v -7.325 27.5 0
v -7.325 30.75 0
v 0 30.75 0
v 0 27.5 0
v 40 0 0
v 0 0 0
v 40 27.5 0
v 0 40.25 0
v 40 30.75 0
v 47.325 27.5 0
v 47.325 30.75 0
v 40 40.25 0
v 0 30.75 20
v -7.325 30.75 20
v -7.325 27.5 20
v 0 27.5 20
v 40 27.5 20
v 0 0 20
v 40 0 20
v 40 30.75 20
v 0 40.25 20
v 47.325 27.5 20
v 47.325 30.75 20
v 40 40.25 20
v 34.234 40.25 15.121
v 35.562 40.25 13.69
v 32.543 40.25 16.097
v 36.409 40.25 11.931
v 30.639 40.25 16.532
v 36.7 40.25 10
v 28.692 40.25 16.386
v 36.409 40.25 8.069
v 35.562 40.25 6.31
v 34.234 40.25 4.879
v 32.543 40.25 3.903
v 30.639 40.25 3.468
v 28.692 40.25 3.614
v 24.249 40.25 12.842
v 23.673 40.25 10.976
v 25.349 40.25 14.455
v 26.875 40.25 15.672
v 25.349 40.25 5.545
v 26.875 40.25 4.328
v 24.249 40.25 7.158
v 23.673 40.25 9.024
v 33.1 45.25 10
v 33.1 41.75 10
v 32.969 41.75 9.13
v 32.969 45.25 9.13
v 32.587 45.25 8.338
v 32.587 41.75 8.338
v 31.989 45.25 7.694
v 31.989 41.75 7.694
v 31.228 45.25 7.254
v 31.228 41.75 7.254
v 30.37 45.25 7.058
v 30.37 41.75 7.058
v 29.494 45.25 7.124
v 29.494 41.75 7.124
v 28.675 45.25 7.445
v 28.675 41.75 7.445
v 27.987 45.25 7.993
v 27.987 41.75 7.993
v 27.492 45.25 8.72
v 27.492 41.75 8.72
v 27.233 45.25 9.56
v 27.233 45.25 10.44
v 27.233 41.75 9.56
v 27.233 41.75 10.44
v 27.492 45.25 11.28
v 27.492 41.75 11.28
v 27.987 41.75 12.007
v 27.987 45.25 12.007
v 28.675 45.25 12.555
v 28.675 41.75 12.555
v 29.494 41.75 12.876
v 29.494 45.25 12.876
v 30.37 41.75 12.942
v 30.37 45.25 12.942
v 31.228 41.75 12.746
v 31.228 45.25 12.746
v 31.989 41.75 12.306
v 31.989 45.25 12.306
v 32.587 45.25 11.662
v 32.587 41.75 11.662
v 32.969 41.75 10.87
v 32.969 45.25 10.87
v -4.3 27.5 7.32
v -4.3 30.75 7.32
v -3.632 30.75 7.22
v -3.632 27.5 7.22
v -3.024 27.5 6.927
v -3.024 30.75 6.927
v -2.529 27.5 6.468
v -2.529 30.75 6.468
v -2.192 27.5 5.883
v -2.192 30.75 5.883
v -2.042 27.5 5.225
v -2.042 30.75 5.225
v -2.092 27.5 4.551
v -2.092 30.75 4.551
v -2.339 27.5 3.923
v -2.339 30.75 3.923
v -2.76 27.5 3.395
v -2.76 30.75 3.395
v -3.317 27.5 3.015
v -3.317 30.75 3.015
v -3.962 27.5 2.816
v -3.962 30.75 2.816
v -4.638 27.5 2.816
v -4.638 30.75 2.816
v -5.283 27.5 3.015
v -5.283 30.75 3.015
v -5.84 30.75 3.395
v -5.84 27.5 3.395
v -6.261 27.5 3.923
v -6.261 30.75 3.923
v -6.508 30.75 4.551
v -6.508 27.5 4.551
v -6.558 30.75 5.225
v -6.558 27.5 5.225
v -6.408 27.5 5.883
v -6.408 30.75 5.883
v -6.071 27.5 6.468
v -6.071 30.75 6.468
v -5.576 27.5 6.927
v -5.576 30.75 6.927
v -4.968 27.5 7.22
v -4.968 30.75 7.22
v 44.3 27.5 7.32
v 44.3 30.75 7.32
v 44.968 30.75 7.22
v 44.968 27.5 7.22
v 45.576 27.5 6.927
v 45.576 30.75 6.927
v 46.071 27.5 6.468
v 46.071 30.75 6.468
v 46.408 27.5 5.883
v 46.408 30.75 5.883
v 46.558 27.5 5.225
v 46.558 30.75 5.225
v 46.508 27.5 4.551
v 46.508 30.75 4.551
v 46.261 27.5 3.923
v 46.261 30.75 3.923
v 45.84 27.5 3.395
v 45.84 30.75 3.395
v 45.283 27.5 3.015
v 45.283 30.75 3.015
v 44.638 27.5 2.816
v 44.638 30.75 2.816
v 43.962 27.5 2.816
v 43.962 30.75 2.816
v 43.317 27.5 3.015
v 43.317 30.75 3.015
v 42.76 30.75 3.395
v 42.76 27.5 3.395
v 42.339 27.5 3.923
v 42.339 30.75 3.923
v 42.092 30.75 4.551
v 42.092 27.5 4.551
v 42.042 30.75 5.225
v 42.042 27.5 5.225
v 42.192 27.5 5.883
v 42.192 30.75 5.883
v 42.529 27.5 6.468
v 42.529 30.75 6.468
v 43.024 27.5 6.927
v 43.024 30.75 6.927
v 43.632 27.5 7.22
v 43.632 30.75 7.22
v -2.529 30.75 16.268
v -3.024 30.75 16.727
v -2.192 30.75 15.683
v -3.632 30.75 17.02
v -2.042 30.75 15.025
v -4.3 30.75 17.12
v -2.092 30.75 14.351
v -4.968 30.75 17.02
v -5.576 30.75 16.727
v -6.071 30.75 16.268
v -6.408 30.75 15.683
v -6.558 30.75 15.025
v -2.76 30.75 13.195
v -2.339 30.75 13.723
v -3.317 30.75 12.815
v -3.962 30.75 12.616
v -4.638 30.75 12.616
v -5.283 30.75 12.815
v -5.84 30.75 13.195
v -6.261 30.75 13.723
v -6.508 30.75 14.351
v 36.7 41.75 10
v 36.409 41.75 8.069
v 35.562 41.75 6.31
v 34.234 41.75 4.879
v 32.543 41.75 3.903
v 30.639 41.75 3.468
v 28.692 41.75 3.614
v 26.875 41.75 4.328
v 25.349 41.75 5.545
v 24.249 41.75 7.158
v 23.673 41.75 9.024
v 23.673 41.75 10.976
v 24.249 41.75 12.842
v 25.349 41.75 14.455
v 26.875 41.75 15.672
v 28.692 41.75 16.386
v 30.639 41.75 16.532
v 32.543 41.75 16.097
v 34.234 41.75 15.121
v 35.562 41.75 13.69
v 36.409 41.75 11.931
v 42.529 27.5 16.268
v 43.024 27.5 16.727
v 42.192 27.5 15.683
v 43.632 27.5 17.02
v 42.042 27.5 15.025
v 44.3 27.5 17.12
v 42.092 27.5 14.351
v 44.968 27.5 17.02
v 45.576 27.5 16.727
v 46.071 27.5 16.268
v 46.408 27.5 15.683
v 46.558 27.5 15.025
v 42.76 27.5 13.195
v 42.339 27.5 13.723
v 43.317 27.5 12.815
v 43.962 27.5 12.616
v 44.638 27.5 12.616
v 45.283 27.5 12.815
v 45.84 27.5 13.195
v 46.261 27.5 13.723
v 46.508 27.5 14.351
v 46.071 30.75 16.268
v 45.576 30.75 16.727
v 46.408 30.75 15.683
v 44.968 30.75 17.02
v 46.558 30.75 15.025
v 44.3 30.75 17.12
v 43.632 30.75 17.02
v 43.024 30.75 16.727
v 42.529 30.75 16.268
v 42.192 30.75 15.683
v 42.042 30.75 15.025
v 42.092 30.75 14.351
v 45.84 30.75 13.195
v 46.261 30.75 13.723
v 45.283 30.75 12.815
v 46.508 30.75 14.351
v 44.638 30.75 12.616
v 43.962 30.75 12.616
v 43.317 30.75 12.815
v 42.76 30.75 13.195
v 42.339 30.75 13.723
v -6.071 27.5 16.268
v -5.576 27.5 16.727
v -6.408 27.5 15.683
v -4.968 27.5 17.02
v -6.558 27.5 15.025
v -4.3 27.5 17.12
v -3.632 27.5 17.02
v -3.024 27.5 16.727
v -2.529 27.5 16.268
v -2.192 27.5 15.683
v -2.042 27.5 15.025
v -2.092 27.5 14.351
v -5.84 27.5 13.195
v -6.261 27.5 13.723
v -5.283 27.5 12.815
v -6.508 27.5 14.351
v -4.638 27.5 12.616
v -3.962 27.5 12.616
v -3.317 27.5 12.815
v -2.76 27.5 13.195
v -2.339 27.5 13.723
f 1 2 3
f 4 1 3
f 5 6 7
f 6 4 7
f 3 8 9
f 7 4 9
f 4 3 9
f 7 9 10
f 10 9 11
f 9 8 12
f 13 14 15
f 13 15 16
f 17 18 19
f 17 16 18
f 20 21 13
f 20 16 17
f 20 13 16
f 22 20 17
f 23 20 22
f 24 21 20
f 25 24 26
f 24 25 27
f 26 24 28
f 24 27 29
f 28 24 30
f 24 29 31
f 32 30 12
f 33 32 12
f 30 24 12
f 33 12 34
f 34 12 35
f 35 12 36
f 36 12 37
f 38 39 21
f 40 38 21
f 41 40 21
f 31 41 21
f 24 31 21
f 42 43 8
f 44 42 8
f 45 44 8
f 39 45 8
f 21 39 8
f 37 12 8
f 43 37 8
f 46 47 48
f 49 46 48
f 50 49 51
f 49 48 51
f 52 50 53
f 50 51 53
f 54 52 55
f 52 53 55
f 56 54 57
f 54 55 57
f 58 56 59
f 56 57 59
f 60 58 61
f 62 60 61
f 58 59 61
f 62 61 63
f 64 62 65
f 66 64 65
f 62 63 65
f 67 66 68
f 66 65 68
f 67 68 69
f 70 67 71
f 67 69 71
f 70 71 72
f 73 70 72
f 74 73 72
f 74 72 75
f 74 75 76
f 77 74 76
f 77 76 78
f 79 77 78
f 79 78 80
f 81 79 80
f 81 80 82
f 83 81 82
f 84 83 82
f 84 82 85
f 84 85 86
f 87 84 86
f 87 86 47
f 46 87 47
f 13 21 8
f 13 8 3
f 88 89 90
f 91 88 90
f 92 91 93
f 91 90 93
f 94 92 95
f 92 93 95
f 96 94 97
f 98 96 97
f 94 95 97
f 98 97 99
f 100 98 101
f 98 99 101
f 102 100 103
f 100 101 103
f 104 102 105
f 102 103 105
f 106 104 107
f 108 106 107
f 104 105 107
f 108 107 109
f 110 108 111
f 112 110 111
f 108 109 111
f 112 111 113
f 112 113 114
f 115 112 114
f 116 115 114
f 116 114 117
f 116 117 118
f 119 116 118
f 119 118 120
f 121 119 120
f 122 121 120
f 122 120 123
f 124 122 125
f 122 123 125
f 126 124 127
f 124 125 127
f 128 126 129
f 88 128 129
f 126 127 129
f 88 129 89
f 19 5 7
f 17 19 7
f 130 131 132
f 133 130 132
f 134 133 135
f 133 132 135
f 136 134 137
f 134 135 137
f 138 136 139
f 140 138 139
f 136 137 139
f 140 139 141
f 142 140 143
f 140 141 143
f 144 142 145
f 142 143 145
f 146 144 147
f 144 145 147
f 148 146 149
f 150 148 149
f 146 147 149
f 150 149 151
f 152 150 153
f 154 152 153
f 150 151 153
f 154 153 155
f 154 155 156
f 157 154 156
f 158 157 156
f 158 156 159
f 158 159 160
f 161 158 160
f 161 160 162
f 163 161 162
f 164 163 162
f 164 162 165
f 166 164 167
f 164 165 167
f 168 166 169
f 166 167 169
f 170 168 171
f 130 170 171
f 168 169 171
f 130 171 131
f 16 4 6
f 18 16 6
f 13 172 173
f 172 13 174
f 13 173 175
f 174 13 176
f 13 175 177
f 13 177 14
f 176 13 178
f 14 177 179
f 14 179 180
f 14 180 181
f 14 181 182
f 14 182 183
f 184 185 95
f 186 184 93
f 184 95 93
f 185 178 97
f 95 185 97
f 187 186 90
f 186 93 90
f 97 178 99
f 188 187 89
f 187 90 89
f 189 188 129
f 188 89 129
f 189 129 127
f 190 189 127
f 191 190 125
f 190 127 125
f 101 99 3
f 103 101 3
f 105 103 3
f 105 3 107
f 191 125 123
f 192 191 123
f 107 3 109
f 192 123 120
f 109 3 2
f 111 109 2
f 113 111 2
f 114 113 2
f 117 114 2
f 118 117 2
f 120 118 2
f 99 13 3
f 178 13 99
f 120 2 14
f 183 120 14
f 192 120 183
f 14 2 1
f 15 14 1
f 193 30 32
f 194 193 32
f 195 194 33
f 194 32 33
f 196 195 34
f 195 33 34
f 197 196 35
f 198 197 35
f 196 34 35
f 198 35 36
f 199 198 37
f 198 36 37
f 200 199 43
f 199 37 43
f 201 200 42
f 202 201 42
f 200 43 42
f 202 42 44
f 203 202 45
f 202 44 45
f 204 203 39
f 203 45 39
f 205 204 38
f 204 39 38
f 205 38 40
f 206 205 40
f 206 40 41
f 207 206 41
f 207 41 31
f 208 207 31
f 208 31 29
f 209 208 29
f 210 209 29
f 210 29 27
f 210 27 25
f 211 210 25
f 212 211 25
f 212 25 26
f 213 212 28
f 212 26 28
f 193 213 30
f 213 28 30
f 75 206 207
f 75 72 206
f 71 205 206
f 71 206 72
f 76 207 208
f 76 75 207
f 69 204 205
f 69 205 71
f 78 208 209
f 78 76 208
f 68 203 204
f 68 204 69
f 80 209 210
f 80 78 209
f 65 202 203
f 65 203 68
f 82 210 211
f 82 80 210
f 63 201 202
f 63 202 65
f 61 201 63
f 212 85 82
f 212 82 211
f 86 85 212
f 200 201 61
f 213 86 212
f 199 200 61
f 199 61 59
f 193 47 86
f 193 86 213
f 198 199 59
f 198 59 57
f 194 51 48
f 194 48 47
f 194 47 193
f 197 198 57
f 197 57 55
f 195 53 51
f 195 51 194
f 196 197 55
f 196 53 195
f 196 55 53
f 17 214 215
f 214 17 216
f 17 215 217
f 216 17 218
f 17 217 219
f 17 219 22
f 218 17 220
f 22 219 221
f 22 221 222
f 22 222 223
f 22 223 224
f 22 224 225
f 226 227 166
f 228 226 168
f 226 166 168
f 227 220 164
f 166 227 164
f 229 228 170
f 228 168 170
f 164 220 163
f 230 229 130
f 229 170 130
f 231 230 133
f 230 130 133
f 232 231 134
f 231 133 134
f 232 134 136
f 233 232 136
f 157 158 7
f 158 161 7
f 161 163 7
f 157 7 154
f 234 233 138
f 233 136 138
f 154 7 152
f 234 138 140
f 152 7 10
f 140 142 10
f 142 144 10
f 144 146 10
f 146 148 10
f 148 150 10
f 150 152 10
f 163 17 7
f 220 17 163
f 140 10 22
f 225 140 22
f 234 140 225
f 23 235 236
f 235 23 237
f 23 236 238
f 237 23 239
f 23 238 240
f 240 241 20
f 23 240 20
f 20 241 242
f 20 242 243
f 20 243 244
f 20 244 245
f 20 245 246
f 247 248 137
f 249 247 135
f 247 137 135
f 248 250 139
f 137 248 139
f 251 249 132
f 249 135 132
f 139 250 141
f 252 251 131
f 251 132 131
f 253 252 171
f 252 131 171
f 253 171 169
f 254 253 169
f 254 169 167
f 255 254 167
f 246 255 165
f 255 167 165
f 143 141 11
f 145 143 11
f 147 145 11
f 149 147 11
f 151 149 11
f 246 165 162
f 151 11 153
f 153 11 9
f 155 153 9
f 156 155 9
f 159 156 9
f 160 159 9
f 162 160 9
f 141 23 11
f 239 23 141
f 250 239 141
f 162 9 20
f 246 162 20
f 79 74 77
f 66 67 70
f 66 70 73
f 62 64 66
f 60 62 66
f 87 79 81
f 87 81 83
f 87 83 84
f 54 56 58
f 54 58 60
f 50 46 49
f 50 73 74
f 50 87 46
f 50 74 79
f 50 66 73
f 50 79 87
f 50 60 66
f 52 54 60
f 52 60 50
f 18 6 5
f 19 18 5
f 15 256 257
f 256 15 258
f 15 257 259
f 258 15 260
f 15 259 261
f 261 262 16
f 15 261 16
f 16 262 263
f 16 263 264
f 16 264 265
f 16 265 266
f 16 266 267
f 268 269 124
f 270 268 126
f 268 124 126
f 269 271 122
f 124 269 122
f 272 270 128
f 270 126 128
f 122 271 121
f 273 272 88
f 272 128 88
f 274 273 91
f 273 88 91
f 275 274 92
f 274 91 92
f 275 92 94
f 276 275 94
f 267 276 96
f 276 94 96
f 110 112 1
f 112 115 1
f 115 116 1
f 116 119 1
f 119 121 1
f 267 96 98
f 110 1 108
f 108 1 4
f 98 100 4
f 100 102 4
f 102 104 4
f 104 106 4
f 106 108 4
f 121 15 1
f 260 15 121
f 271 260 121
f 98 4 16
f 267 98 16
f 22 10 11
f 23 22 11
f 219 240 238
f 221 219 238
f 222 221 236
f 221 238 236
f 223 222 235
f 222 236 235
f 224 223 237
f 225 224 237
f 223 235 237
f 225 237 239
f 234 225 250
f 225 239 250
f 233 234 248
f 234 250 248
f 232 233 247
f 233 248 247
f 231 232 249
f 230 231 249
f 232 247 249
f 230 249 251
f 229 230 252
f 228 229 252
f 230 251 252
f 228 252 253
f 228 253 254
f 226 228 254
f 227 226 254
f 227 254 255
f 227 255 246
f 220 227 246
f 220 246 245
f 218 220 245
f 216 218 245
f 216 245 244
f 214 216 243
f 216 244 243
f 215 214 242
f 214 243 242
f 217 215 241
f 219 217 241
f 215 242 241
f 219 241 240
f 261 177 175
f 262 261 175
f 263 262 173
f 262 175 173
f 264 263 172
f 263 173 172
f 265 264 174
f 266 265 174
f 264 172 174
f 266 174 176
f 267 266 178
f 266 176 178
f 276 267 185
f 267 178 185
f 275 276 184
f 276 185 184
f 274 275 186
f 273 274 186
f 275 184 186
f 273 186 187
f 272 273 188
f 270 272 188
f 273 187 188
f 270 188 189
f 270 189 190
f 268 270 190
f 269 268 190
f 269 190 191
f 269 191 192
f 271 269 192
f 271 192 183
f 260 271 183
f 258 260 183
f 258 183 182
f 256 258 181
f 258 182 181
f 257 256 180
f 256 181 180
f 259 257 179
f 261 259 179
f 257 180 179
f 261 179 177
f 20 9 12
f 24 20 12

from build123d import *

# Parameters (mm, degrees)
BOSS_EXTRUDE1_DEPTH = 20
SKETCH2_R           = 2.264817621
CUT_EXTRUDE1_DEPTH  = 3.25
SKETCH3_R           = 2.95
BOSS_EXTRUDE2_DEPTH = 5
SKETCH4_R           = 6.55
BOSS_EXTRUDE3_DEPTH = 1.5


with BuildPart() as part:
    # Sketch1 → Boss-Extrude1 (new body)
    with BuildSketch(Plane.XY):
        Polygon((0, 0), (40, 0), (40, 27.5), (47.325, 27.5), (47.325, 30.75), (40, 30.75), (40, 40.25), (0, 40.25), (0, 30.75), (-7.325, 30.75), (-7.325, 27.5), (0, 27.5), align=None)
    extrude(amount=BOSS_EXTRUDE1_DEPTH)

    # Sketch2 → Cut-Extrude1 (cut)
    with BuildSketch(Plane(origin=(0, 30.75, 0), x_dir=(1, 0, 0), z_dir=(0, 1, 0))):
        with Locations(Location((-4.3, -5.055444694, 0), (0, 0, 270))):
            Circle(SKETCH2_R)
        with Locations(Location((-4.3, -14.855444694, 0), (0, 0, 270))):
            Circle(SKETCH2_R)
        with Locations(Location((44.3, -14.855444694, 0), (0, 0, 270))):
            Circle(SKETCH2_R)
        with Locations(Location((44.3, -5.055444694, 0), (0, 0, 270))):
            Circle(SKETCH2_R)
    extrude(amount=-CUT_EXTRUDE1_DEPTH, mode=Mode.SUBTRACT)

    # Sketch3 → Boss-Extrude2 (add)
    with BuildSketch(Plane(origin=(0, 40.25, 0), x_dir=(1, 0, 0), z_dir=(0, 1, 0))):
        with Locations((30.15, -10)):
            Circle(SKETCH3_R)
    extrude(amount=BOSS_EXTRUDE2_DEPTH)

    # Sketch4 → Boss-Extrude3 (add)
    with BuildSketch(Plane(origin=(0, 40.25, 0), x_dir=(1, 0, 0), z_dir=(0, 1, 0))):
        with Locations((30.15, -10)):
            Circle(SKETCH4_R)
    extrude(amount=BOSS_EXTRUDE3_DEPTH)


solid = part.part
